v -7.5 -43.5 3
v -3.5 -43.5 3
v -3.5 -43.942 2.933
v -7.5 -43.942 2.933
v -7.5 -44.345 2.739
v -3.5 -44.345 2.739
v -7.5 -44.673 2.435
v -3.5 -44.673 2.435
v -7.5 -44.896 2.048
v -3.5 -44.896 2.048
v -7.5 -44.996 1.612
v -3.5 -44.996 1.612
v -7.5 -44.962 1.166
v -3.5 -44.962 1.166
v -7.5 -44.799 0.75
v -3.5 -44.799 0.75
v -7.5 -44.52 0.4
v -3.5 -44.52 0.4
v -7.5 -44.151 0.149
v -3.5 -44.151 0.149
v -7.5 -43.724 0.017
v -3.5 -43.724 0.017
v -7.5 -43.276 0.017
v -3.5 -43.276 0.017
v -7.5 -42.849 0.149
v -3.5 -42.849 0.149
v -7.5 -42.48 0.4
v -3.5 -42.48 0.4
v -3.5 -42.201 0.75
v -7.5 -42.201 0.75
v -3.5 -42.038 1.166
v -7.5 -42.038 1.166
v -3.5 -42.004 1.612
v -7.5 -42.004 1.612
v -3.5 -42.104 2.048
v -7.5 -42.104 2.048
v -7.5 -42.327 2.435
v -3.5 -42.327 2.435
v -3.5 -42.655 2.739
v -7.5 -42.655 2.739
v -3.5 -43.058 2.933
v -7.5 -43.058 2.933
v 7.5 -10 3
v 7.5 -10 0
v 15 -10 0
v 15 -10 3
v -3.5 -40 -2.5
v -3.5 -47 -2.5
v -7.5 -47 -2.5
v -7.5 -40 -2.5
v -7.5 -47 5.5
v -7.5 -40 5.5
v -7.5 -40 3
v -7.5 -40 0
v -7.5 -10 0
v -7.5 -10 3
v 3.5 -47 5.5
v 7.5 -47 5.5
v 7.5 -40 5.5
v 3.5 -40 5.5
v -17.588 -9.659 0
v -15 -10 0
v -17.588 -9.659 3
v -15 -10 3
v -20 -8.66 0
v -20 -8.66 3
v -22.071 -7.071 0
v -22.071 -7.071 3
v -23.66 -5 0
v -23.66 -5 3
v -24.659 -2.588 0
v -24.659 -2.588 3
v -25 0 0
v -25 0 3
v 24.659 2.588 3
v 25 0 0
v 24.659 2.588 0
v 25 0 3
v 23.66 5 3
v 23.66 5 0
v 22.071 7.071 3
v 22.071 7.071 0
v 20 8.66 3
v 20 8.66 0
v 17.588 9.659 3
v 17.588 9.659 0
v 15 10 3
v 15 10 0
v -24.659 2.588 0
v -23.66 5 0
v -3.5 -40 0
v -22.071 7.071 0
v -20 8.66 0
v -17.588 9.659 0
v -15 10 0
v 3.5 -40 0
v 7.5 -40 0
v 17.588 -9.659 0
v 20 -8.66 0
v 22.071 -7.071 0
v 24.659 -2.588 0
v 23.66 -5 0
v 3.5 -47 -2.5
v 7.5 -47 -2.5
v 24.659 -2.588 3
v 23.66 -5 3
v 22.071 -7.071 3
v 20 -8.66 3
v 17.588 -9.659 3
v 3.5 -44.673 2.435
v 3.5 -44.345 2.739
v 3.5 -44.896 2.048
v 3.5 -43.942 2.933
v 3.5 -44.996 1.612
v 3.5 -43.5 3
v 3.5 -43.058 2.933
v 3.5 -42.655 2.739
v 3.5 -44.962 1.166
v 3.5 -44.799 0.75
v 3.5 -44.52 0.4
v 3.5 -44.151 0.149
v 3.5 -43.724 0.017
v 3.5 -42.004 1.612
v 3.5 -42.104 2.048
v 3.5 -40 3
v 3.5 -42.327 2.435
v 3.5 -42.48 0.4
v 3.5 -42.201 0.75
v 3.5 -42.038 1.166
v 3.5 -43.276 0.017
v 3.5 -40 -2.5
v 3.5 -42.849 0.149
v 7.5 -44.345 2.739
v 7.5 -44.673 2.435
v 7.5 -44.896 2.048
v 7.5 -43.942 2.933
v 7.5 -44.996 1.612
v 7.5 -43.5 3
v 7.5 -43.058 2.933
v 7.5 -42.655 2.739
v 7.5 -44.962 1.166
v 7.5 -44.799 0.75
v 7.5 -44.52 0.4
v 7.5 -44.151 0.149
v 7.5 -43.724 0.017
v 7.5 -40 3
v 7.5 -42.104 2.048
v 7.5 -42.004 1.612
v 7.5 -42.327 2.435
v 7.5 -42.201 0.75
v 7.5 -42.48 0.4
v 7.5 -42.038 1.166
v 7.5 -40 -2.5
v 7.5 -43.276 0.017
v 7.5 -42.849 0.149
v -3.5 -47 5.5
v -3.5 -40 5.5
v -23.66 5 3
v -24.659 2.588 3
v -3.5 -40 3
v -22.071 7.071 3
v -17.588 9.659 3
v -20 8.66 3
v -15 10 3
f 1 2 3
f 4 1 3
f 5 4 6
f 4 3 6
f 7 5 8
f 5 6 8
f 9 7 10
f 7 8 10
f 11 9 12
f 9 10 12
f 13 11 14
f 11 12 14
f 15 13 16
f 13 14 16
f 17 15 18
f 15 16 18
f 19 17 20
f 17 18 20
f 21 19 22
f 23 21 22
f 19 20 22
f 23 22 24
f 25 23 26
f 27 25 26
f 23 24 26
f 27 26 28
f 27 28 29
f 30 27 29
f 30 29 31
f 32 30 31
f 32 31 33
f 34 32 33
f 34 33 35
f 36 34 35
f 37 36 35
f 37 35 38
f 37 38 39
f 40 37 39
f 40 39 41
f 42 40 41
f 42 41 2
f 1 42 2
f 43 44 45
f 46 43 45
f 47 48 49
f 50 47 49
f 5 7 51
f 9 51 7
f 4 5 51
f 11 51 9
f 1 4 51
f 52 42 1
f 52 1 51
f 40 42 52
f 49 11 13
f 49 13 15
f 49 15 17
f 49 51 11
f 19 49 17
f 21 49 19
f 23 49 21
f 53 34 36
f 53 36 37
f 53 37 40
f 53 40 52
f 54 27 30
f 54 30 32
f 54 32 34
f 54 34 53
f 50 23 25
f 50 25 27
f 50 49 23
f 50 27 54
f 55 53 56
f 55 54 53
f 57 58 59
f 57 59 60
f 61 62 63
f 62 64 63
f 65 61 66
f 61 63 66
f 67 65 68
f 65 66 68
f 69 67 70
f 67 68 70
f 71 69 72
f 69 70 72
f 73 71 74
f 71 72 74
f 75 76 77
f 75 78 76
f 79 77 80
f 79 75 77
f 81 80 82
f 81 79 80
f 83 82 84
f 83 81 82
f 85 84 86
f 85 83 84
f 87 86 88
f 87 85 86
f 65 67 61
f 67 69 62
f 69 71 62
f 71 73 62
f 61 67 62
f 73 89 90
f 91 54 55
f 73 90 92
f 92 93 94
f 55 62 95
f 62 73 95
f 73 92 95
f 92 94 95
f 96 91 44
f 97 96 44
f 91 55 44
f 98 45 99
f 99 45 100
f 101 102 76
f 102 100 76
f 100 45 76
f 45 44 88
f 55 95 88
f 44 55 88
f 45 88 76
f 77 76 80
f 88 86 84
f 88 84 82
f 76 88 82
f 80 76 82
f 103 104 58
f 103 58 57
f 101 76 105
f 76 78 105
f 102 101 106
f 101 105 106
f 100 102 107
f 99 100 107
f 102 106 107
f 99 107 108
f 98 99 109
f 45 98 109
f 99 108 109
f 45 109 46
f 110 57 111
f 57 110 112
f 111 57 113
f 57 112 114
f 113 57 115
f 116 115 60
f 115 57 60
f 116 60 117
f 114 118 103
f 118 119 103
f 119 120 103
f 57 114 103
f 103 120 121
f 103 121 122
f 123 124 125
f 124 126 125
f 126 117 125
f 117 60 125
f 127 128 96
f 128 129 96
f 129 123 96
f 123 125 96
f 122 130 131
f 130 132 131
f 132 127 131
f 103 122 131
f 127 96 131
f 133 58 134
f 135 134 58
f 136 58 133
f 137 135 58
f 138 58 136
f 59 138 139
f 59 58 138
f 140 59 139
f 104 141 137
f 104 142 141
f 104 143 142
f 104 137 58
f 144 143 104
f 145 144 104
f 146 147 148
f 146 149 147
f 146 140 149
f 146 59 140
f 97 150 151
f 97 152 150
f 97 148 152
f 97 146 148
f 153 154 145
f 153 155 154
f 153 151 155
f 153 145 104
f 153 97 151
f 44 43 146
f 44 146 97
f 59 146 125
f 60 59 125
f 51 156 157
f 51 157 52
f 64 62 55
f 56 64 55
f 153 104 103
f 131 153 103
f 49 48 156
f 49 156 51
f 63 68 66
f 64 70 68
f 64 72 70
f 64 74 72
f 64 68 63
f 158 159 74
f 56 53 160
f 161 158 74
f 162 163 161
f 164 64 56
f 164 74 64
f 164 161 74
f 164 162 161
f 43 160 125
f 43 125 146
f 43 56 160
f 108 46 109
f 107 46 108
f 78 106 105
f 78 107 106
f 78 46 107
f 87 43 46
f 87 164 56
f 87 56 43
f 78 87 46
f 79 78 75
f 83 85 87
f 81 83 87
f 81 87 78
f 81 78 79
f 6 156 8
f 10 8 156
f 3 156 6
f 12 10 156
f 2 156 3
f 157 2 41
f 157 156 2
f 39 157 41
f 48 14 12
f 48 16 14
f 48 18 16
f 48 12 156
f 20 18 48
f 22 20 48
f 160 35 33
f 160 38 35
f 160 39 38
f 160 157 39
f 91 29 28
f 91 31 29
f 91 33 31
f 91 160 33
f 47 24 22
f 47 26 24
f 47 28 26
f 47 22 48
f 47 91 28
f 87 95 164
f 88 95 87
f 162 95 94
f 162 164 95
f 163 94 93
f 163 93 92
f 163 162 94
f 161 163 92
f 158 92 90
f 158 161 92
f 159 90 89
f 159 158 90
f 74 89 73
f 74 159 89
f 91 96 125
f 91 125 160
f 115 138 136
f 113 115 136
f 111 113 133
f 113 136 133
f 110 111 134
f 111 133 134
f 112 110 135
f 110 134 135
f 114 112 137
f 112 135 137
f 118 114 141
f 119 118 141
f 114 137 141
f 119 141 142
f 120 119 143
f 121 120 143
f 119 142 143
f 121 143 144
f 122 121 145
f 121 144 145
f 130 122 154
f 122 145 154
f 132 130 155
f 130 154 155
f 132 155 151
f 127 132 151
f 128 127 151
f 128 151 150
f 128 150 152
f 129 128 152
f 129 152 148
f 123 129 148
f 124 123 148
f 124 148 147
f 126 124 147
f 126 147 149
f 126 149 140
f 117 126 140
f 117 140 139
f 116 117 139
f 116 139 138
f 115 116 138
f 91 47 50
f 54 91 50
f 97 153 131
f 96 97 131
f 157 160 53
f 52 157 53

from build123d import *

# Parameters (mm, degrees)
SKETCH_1_W          = 50
SKETCH_1_H          = 20
EXTRUDE_1_DEPTH     = 3
FILLET_1_R          = 10
FILLET_2_R          = 10
FILLET_3_R          = 10
FILLET_4_R          = 10
SKETCH_2_W          = 15
SKETCH_2_H          = 30
EXTRUDE_2_DEPTH     = 3
SKETCH_4_W          = 4
SKETCH_4_H          = 8
EXTRUDE_4_DEPTH     = 7
SKETCH_5_R          = 1.5
CUT_EXTRUDE_1_DEPTH = 58.406445631


with BuildPart() as part:
    # 草图1 → 凸台-拉伸1 (new body)
    with BuildSketch(Plane.XY):
        Rectangle(SKETCH_1_W, SKETCH_1_H)
    extrude(amount=EXTRUDE_1_DEPTH)

    # 圆角1
    fillet_1_edges = [part.edges().sort_by_distance(p)[0] for p in [
        (25, 10, 1.5),
    ]]
    fillet(fillet_1_edges, radius=FILLET_1_R)

    # 圆角2
    fillet_2_edges = [part.edges().sort_by_distance(p)[0] for p in [
        (-25, 10, 1.5),
    ]]
    fillet(fillet_2_edges, radius=FILLET_2_R)

    # 圆角3
    fillet_3_edges = [part.edges().sort_by_distance(p)[0] for p in [
        (25, -10, 1.5),
    ]]
    fillet(fillet_3_edges, radius=FILLET_3_R - 0.0001)  # a hair under: the kernel refuses the full size

    # 圆角4
    fillet_4_edges = [part.edges().sort_by_distance(p)[0] for p in [
        (-25, -10, 1.5),
    ]]
    fillet(fillet_4_edges, radius=FILLET_4_R - 0.0001)  # a hair under: the kernel refuses the full size

    # 草图2 → 凸台-拉伸2 (add)
    with BuildSketch(Plane(origin=(0, 0, 0), x_dir=(-1, 0, 0), z_dir=(0, 0, -1))):
        with Locations((0, -25)):
            Rectangle(SKETCH_2_W, SKETCH_2_H)
    extrude(amount=-EXTRUDE_2_DEPTH)

    # 草图4 → 凸台-拉伸4 (add)
    with BuildSketch(Plane(origin=(0, -40, 0), x_dir=(-1, 0, 0), z_dir=(0, -1, 0))):
        with Locations((-5.5, -1.5)):
            Rectangle(SKETCH_4_W, SKETCH_4_H)
        with Locations((5.5, -1.5)):
            Rectangle(SKETCH_4_W, SKETCH_4_H)
    extrude(amount=EXTRUDE_4_DEPTH)

    # 草图5 → 切除-拉伸1 (cut, through all)
    with BuildSketch(Plane(origin=(7.5, 0, 0), x_dir=(0, 0, -1), z_dir=(1, 0, 0))):
        with Locations(Location((-1.5, -43.5, 0), (0, 0, 180))):
            Circle(SKETCH_5_R)
    extrude(amount=-CUT_EXTRUDE_1_DEPTH, mode=Mode.SUBTRACT)


solid = part.part
